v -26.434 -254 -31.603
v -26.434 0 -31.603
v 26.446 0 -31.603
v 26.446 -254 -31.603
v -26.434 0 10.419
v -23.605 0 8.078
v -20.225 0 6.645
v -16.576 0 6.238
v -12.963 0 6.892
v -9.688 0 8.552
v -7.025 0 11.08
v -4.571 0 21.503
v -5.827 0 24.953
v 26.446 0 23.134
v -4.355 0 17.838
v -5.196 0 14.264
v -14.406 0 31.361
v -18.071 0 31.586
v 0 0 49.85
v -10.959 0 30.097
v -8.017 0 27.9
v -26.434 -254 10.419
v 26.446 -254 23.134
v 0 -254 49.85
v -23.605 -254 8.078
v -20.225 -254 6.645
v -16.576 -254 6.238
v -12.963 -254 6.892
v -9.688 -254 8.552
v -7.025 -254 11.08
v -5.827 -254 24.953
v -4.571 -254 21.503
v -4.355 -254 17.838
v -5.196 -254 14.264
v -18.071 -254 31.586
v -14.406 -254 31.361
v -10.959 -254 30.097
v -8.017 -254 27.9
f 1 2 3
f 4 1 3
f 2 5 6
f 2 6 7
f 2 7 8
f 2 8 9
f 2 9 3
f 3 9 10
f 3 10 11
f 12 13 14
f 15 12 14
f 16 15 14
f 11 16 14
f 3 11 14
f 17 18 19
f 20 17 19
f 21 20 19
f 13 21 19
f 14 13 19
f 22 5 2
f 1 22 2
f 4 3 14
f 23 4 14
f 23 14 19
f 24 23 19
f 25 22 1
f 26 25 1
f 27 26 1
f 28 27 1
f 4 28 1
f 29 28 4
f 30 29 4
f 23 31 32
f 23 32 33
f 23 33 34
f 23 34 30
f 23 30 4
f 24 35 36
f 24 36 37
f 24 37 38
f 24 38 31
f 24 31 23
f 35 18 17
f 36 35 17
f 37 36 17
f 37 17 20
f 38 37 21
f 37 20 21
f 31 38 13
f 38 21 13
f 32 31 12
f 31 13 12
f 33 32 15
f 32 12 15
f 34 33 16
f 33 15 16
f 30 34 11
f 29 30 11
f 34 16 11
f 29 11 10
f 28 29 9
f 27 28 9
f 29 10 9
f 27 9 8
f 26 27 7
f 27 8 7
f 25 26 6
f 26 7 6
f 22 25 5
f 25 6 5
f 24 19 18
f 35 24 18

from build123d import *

# Parameters (mm, degrees)
F1_DEPTH = 254
F3_D     = 25.4


with BuildPart() as f1:
    # F0 (on Front) → F1 (new body)
    with BuildSketch(Plane.XZ):
        Polygon((0, 49.849775), (-26.433898, 23.133671), (-26.433898, -31.603329), (26.446328, -31.603329), (26.446328, 23.133671), align=None)
    extrude(amount=F1_DEPTH)

    # F3 (through all)
    with Locations(Plane.XZ.offset(254)):
        with Locations((-17.007671, 18.930277)):
            Hole(F3_D / 2)


solid = f1.part
